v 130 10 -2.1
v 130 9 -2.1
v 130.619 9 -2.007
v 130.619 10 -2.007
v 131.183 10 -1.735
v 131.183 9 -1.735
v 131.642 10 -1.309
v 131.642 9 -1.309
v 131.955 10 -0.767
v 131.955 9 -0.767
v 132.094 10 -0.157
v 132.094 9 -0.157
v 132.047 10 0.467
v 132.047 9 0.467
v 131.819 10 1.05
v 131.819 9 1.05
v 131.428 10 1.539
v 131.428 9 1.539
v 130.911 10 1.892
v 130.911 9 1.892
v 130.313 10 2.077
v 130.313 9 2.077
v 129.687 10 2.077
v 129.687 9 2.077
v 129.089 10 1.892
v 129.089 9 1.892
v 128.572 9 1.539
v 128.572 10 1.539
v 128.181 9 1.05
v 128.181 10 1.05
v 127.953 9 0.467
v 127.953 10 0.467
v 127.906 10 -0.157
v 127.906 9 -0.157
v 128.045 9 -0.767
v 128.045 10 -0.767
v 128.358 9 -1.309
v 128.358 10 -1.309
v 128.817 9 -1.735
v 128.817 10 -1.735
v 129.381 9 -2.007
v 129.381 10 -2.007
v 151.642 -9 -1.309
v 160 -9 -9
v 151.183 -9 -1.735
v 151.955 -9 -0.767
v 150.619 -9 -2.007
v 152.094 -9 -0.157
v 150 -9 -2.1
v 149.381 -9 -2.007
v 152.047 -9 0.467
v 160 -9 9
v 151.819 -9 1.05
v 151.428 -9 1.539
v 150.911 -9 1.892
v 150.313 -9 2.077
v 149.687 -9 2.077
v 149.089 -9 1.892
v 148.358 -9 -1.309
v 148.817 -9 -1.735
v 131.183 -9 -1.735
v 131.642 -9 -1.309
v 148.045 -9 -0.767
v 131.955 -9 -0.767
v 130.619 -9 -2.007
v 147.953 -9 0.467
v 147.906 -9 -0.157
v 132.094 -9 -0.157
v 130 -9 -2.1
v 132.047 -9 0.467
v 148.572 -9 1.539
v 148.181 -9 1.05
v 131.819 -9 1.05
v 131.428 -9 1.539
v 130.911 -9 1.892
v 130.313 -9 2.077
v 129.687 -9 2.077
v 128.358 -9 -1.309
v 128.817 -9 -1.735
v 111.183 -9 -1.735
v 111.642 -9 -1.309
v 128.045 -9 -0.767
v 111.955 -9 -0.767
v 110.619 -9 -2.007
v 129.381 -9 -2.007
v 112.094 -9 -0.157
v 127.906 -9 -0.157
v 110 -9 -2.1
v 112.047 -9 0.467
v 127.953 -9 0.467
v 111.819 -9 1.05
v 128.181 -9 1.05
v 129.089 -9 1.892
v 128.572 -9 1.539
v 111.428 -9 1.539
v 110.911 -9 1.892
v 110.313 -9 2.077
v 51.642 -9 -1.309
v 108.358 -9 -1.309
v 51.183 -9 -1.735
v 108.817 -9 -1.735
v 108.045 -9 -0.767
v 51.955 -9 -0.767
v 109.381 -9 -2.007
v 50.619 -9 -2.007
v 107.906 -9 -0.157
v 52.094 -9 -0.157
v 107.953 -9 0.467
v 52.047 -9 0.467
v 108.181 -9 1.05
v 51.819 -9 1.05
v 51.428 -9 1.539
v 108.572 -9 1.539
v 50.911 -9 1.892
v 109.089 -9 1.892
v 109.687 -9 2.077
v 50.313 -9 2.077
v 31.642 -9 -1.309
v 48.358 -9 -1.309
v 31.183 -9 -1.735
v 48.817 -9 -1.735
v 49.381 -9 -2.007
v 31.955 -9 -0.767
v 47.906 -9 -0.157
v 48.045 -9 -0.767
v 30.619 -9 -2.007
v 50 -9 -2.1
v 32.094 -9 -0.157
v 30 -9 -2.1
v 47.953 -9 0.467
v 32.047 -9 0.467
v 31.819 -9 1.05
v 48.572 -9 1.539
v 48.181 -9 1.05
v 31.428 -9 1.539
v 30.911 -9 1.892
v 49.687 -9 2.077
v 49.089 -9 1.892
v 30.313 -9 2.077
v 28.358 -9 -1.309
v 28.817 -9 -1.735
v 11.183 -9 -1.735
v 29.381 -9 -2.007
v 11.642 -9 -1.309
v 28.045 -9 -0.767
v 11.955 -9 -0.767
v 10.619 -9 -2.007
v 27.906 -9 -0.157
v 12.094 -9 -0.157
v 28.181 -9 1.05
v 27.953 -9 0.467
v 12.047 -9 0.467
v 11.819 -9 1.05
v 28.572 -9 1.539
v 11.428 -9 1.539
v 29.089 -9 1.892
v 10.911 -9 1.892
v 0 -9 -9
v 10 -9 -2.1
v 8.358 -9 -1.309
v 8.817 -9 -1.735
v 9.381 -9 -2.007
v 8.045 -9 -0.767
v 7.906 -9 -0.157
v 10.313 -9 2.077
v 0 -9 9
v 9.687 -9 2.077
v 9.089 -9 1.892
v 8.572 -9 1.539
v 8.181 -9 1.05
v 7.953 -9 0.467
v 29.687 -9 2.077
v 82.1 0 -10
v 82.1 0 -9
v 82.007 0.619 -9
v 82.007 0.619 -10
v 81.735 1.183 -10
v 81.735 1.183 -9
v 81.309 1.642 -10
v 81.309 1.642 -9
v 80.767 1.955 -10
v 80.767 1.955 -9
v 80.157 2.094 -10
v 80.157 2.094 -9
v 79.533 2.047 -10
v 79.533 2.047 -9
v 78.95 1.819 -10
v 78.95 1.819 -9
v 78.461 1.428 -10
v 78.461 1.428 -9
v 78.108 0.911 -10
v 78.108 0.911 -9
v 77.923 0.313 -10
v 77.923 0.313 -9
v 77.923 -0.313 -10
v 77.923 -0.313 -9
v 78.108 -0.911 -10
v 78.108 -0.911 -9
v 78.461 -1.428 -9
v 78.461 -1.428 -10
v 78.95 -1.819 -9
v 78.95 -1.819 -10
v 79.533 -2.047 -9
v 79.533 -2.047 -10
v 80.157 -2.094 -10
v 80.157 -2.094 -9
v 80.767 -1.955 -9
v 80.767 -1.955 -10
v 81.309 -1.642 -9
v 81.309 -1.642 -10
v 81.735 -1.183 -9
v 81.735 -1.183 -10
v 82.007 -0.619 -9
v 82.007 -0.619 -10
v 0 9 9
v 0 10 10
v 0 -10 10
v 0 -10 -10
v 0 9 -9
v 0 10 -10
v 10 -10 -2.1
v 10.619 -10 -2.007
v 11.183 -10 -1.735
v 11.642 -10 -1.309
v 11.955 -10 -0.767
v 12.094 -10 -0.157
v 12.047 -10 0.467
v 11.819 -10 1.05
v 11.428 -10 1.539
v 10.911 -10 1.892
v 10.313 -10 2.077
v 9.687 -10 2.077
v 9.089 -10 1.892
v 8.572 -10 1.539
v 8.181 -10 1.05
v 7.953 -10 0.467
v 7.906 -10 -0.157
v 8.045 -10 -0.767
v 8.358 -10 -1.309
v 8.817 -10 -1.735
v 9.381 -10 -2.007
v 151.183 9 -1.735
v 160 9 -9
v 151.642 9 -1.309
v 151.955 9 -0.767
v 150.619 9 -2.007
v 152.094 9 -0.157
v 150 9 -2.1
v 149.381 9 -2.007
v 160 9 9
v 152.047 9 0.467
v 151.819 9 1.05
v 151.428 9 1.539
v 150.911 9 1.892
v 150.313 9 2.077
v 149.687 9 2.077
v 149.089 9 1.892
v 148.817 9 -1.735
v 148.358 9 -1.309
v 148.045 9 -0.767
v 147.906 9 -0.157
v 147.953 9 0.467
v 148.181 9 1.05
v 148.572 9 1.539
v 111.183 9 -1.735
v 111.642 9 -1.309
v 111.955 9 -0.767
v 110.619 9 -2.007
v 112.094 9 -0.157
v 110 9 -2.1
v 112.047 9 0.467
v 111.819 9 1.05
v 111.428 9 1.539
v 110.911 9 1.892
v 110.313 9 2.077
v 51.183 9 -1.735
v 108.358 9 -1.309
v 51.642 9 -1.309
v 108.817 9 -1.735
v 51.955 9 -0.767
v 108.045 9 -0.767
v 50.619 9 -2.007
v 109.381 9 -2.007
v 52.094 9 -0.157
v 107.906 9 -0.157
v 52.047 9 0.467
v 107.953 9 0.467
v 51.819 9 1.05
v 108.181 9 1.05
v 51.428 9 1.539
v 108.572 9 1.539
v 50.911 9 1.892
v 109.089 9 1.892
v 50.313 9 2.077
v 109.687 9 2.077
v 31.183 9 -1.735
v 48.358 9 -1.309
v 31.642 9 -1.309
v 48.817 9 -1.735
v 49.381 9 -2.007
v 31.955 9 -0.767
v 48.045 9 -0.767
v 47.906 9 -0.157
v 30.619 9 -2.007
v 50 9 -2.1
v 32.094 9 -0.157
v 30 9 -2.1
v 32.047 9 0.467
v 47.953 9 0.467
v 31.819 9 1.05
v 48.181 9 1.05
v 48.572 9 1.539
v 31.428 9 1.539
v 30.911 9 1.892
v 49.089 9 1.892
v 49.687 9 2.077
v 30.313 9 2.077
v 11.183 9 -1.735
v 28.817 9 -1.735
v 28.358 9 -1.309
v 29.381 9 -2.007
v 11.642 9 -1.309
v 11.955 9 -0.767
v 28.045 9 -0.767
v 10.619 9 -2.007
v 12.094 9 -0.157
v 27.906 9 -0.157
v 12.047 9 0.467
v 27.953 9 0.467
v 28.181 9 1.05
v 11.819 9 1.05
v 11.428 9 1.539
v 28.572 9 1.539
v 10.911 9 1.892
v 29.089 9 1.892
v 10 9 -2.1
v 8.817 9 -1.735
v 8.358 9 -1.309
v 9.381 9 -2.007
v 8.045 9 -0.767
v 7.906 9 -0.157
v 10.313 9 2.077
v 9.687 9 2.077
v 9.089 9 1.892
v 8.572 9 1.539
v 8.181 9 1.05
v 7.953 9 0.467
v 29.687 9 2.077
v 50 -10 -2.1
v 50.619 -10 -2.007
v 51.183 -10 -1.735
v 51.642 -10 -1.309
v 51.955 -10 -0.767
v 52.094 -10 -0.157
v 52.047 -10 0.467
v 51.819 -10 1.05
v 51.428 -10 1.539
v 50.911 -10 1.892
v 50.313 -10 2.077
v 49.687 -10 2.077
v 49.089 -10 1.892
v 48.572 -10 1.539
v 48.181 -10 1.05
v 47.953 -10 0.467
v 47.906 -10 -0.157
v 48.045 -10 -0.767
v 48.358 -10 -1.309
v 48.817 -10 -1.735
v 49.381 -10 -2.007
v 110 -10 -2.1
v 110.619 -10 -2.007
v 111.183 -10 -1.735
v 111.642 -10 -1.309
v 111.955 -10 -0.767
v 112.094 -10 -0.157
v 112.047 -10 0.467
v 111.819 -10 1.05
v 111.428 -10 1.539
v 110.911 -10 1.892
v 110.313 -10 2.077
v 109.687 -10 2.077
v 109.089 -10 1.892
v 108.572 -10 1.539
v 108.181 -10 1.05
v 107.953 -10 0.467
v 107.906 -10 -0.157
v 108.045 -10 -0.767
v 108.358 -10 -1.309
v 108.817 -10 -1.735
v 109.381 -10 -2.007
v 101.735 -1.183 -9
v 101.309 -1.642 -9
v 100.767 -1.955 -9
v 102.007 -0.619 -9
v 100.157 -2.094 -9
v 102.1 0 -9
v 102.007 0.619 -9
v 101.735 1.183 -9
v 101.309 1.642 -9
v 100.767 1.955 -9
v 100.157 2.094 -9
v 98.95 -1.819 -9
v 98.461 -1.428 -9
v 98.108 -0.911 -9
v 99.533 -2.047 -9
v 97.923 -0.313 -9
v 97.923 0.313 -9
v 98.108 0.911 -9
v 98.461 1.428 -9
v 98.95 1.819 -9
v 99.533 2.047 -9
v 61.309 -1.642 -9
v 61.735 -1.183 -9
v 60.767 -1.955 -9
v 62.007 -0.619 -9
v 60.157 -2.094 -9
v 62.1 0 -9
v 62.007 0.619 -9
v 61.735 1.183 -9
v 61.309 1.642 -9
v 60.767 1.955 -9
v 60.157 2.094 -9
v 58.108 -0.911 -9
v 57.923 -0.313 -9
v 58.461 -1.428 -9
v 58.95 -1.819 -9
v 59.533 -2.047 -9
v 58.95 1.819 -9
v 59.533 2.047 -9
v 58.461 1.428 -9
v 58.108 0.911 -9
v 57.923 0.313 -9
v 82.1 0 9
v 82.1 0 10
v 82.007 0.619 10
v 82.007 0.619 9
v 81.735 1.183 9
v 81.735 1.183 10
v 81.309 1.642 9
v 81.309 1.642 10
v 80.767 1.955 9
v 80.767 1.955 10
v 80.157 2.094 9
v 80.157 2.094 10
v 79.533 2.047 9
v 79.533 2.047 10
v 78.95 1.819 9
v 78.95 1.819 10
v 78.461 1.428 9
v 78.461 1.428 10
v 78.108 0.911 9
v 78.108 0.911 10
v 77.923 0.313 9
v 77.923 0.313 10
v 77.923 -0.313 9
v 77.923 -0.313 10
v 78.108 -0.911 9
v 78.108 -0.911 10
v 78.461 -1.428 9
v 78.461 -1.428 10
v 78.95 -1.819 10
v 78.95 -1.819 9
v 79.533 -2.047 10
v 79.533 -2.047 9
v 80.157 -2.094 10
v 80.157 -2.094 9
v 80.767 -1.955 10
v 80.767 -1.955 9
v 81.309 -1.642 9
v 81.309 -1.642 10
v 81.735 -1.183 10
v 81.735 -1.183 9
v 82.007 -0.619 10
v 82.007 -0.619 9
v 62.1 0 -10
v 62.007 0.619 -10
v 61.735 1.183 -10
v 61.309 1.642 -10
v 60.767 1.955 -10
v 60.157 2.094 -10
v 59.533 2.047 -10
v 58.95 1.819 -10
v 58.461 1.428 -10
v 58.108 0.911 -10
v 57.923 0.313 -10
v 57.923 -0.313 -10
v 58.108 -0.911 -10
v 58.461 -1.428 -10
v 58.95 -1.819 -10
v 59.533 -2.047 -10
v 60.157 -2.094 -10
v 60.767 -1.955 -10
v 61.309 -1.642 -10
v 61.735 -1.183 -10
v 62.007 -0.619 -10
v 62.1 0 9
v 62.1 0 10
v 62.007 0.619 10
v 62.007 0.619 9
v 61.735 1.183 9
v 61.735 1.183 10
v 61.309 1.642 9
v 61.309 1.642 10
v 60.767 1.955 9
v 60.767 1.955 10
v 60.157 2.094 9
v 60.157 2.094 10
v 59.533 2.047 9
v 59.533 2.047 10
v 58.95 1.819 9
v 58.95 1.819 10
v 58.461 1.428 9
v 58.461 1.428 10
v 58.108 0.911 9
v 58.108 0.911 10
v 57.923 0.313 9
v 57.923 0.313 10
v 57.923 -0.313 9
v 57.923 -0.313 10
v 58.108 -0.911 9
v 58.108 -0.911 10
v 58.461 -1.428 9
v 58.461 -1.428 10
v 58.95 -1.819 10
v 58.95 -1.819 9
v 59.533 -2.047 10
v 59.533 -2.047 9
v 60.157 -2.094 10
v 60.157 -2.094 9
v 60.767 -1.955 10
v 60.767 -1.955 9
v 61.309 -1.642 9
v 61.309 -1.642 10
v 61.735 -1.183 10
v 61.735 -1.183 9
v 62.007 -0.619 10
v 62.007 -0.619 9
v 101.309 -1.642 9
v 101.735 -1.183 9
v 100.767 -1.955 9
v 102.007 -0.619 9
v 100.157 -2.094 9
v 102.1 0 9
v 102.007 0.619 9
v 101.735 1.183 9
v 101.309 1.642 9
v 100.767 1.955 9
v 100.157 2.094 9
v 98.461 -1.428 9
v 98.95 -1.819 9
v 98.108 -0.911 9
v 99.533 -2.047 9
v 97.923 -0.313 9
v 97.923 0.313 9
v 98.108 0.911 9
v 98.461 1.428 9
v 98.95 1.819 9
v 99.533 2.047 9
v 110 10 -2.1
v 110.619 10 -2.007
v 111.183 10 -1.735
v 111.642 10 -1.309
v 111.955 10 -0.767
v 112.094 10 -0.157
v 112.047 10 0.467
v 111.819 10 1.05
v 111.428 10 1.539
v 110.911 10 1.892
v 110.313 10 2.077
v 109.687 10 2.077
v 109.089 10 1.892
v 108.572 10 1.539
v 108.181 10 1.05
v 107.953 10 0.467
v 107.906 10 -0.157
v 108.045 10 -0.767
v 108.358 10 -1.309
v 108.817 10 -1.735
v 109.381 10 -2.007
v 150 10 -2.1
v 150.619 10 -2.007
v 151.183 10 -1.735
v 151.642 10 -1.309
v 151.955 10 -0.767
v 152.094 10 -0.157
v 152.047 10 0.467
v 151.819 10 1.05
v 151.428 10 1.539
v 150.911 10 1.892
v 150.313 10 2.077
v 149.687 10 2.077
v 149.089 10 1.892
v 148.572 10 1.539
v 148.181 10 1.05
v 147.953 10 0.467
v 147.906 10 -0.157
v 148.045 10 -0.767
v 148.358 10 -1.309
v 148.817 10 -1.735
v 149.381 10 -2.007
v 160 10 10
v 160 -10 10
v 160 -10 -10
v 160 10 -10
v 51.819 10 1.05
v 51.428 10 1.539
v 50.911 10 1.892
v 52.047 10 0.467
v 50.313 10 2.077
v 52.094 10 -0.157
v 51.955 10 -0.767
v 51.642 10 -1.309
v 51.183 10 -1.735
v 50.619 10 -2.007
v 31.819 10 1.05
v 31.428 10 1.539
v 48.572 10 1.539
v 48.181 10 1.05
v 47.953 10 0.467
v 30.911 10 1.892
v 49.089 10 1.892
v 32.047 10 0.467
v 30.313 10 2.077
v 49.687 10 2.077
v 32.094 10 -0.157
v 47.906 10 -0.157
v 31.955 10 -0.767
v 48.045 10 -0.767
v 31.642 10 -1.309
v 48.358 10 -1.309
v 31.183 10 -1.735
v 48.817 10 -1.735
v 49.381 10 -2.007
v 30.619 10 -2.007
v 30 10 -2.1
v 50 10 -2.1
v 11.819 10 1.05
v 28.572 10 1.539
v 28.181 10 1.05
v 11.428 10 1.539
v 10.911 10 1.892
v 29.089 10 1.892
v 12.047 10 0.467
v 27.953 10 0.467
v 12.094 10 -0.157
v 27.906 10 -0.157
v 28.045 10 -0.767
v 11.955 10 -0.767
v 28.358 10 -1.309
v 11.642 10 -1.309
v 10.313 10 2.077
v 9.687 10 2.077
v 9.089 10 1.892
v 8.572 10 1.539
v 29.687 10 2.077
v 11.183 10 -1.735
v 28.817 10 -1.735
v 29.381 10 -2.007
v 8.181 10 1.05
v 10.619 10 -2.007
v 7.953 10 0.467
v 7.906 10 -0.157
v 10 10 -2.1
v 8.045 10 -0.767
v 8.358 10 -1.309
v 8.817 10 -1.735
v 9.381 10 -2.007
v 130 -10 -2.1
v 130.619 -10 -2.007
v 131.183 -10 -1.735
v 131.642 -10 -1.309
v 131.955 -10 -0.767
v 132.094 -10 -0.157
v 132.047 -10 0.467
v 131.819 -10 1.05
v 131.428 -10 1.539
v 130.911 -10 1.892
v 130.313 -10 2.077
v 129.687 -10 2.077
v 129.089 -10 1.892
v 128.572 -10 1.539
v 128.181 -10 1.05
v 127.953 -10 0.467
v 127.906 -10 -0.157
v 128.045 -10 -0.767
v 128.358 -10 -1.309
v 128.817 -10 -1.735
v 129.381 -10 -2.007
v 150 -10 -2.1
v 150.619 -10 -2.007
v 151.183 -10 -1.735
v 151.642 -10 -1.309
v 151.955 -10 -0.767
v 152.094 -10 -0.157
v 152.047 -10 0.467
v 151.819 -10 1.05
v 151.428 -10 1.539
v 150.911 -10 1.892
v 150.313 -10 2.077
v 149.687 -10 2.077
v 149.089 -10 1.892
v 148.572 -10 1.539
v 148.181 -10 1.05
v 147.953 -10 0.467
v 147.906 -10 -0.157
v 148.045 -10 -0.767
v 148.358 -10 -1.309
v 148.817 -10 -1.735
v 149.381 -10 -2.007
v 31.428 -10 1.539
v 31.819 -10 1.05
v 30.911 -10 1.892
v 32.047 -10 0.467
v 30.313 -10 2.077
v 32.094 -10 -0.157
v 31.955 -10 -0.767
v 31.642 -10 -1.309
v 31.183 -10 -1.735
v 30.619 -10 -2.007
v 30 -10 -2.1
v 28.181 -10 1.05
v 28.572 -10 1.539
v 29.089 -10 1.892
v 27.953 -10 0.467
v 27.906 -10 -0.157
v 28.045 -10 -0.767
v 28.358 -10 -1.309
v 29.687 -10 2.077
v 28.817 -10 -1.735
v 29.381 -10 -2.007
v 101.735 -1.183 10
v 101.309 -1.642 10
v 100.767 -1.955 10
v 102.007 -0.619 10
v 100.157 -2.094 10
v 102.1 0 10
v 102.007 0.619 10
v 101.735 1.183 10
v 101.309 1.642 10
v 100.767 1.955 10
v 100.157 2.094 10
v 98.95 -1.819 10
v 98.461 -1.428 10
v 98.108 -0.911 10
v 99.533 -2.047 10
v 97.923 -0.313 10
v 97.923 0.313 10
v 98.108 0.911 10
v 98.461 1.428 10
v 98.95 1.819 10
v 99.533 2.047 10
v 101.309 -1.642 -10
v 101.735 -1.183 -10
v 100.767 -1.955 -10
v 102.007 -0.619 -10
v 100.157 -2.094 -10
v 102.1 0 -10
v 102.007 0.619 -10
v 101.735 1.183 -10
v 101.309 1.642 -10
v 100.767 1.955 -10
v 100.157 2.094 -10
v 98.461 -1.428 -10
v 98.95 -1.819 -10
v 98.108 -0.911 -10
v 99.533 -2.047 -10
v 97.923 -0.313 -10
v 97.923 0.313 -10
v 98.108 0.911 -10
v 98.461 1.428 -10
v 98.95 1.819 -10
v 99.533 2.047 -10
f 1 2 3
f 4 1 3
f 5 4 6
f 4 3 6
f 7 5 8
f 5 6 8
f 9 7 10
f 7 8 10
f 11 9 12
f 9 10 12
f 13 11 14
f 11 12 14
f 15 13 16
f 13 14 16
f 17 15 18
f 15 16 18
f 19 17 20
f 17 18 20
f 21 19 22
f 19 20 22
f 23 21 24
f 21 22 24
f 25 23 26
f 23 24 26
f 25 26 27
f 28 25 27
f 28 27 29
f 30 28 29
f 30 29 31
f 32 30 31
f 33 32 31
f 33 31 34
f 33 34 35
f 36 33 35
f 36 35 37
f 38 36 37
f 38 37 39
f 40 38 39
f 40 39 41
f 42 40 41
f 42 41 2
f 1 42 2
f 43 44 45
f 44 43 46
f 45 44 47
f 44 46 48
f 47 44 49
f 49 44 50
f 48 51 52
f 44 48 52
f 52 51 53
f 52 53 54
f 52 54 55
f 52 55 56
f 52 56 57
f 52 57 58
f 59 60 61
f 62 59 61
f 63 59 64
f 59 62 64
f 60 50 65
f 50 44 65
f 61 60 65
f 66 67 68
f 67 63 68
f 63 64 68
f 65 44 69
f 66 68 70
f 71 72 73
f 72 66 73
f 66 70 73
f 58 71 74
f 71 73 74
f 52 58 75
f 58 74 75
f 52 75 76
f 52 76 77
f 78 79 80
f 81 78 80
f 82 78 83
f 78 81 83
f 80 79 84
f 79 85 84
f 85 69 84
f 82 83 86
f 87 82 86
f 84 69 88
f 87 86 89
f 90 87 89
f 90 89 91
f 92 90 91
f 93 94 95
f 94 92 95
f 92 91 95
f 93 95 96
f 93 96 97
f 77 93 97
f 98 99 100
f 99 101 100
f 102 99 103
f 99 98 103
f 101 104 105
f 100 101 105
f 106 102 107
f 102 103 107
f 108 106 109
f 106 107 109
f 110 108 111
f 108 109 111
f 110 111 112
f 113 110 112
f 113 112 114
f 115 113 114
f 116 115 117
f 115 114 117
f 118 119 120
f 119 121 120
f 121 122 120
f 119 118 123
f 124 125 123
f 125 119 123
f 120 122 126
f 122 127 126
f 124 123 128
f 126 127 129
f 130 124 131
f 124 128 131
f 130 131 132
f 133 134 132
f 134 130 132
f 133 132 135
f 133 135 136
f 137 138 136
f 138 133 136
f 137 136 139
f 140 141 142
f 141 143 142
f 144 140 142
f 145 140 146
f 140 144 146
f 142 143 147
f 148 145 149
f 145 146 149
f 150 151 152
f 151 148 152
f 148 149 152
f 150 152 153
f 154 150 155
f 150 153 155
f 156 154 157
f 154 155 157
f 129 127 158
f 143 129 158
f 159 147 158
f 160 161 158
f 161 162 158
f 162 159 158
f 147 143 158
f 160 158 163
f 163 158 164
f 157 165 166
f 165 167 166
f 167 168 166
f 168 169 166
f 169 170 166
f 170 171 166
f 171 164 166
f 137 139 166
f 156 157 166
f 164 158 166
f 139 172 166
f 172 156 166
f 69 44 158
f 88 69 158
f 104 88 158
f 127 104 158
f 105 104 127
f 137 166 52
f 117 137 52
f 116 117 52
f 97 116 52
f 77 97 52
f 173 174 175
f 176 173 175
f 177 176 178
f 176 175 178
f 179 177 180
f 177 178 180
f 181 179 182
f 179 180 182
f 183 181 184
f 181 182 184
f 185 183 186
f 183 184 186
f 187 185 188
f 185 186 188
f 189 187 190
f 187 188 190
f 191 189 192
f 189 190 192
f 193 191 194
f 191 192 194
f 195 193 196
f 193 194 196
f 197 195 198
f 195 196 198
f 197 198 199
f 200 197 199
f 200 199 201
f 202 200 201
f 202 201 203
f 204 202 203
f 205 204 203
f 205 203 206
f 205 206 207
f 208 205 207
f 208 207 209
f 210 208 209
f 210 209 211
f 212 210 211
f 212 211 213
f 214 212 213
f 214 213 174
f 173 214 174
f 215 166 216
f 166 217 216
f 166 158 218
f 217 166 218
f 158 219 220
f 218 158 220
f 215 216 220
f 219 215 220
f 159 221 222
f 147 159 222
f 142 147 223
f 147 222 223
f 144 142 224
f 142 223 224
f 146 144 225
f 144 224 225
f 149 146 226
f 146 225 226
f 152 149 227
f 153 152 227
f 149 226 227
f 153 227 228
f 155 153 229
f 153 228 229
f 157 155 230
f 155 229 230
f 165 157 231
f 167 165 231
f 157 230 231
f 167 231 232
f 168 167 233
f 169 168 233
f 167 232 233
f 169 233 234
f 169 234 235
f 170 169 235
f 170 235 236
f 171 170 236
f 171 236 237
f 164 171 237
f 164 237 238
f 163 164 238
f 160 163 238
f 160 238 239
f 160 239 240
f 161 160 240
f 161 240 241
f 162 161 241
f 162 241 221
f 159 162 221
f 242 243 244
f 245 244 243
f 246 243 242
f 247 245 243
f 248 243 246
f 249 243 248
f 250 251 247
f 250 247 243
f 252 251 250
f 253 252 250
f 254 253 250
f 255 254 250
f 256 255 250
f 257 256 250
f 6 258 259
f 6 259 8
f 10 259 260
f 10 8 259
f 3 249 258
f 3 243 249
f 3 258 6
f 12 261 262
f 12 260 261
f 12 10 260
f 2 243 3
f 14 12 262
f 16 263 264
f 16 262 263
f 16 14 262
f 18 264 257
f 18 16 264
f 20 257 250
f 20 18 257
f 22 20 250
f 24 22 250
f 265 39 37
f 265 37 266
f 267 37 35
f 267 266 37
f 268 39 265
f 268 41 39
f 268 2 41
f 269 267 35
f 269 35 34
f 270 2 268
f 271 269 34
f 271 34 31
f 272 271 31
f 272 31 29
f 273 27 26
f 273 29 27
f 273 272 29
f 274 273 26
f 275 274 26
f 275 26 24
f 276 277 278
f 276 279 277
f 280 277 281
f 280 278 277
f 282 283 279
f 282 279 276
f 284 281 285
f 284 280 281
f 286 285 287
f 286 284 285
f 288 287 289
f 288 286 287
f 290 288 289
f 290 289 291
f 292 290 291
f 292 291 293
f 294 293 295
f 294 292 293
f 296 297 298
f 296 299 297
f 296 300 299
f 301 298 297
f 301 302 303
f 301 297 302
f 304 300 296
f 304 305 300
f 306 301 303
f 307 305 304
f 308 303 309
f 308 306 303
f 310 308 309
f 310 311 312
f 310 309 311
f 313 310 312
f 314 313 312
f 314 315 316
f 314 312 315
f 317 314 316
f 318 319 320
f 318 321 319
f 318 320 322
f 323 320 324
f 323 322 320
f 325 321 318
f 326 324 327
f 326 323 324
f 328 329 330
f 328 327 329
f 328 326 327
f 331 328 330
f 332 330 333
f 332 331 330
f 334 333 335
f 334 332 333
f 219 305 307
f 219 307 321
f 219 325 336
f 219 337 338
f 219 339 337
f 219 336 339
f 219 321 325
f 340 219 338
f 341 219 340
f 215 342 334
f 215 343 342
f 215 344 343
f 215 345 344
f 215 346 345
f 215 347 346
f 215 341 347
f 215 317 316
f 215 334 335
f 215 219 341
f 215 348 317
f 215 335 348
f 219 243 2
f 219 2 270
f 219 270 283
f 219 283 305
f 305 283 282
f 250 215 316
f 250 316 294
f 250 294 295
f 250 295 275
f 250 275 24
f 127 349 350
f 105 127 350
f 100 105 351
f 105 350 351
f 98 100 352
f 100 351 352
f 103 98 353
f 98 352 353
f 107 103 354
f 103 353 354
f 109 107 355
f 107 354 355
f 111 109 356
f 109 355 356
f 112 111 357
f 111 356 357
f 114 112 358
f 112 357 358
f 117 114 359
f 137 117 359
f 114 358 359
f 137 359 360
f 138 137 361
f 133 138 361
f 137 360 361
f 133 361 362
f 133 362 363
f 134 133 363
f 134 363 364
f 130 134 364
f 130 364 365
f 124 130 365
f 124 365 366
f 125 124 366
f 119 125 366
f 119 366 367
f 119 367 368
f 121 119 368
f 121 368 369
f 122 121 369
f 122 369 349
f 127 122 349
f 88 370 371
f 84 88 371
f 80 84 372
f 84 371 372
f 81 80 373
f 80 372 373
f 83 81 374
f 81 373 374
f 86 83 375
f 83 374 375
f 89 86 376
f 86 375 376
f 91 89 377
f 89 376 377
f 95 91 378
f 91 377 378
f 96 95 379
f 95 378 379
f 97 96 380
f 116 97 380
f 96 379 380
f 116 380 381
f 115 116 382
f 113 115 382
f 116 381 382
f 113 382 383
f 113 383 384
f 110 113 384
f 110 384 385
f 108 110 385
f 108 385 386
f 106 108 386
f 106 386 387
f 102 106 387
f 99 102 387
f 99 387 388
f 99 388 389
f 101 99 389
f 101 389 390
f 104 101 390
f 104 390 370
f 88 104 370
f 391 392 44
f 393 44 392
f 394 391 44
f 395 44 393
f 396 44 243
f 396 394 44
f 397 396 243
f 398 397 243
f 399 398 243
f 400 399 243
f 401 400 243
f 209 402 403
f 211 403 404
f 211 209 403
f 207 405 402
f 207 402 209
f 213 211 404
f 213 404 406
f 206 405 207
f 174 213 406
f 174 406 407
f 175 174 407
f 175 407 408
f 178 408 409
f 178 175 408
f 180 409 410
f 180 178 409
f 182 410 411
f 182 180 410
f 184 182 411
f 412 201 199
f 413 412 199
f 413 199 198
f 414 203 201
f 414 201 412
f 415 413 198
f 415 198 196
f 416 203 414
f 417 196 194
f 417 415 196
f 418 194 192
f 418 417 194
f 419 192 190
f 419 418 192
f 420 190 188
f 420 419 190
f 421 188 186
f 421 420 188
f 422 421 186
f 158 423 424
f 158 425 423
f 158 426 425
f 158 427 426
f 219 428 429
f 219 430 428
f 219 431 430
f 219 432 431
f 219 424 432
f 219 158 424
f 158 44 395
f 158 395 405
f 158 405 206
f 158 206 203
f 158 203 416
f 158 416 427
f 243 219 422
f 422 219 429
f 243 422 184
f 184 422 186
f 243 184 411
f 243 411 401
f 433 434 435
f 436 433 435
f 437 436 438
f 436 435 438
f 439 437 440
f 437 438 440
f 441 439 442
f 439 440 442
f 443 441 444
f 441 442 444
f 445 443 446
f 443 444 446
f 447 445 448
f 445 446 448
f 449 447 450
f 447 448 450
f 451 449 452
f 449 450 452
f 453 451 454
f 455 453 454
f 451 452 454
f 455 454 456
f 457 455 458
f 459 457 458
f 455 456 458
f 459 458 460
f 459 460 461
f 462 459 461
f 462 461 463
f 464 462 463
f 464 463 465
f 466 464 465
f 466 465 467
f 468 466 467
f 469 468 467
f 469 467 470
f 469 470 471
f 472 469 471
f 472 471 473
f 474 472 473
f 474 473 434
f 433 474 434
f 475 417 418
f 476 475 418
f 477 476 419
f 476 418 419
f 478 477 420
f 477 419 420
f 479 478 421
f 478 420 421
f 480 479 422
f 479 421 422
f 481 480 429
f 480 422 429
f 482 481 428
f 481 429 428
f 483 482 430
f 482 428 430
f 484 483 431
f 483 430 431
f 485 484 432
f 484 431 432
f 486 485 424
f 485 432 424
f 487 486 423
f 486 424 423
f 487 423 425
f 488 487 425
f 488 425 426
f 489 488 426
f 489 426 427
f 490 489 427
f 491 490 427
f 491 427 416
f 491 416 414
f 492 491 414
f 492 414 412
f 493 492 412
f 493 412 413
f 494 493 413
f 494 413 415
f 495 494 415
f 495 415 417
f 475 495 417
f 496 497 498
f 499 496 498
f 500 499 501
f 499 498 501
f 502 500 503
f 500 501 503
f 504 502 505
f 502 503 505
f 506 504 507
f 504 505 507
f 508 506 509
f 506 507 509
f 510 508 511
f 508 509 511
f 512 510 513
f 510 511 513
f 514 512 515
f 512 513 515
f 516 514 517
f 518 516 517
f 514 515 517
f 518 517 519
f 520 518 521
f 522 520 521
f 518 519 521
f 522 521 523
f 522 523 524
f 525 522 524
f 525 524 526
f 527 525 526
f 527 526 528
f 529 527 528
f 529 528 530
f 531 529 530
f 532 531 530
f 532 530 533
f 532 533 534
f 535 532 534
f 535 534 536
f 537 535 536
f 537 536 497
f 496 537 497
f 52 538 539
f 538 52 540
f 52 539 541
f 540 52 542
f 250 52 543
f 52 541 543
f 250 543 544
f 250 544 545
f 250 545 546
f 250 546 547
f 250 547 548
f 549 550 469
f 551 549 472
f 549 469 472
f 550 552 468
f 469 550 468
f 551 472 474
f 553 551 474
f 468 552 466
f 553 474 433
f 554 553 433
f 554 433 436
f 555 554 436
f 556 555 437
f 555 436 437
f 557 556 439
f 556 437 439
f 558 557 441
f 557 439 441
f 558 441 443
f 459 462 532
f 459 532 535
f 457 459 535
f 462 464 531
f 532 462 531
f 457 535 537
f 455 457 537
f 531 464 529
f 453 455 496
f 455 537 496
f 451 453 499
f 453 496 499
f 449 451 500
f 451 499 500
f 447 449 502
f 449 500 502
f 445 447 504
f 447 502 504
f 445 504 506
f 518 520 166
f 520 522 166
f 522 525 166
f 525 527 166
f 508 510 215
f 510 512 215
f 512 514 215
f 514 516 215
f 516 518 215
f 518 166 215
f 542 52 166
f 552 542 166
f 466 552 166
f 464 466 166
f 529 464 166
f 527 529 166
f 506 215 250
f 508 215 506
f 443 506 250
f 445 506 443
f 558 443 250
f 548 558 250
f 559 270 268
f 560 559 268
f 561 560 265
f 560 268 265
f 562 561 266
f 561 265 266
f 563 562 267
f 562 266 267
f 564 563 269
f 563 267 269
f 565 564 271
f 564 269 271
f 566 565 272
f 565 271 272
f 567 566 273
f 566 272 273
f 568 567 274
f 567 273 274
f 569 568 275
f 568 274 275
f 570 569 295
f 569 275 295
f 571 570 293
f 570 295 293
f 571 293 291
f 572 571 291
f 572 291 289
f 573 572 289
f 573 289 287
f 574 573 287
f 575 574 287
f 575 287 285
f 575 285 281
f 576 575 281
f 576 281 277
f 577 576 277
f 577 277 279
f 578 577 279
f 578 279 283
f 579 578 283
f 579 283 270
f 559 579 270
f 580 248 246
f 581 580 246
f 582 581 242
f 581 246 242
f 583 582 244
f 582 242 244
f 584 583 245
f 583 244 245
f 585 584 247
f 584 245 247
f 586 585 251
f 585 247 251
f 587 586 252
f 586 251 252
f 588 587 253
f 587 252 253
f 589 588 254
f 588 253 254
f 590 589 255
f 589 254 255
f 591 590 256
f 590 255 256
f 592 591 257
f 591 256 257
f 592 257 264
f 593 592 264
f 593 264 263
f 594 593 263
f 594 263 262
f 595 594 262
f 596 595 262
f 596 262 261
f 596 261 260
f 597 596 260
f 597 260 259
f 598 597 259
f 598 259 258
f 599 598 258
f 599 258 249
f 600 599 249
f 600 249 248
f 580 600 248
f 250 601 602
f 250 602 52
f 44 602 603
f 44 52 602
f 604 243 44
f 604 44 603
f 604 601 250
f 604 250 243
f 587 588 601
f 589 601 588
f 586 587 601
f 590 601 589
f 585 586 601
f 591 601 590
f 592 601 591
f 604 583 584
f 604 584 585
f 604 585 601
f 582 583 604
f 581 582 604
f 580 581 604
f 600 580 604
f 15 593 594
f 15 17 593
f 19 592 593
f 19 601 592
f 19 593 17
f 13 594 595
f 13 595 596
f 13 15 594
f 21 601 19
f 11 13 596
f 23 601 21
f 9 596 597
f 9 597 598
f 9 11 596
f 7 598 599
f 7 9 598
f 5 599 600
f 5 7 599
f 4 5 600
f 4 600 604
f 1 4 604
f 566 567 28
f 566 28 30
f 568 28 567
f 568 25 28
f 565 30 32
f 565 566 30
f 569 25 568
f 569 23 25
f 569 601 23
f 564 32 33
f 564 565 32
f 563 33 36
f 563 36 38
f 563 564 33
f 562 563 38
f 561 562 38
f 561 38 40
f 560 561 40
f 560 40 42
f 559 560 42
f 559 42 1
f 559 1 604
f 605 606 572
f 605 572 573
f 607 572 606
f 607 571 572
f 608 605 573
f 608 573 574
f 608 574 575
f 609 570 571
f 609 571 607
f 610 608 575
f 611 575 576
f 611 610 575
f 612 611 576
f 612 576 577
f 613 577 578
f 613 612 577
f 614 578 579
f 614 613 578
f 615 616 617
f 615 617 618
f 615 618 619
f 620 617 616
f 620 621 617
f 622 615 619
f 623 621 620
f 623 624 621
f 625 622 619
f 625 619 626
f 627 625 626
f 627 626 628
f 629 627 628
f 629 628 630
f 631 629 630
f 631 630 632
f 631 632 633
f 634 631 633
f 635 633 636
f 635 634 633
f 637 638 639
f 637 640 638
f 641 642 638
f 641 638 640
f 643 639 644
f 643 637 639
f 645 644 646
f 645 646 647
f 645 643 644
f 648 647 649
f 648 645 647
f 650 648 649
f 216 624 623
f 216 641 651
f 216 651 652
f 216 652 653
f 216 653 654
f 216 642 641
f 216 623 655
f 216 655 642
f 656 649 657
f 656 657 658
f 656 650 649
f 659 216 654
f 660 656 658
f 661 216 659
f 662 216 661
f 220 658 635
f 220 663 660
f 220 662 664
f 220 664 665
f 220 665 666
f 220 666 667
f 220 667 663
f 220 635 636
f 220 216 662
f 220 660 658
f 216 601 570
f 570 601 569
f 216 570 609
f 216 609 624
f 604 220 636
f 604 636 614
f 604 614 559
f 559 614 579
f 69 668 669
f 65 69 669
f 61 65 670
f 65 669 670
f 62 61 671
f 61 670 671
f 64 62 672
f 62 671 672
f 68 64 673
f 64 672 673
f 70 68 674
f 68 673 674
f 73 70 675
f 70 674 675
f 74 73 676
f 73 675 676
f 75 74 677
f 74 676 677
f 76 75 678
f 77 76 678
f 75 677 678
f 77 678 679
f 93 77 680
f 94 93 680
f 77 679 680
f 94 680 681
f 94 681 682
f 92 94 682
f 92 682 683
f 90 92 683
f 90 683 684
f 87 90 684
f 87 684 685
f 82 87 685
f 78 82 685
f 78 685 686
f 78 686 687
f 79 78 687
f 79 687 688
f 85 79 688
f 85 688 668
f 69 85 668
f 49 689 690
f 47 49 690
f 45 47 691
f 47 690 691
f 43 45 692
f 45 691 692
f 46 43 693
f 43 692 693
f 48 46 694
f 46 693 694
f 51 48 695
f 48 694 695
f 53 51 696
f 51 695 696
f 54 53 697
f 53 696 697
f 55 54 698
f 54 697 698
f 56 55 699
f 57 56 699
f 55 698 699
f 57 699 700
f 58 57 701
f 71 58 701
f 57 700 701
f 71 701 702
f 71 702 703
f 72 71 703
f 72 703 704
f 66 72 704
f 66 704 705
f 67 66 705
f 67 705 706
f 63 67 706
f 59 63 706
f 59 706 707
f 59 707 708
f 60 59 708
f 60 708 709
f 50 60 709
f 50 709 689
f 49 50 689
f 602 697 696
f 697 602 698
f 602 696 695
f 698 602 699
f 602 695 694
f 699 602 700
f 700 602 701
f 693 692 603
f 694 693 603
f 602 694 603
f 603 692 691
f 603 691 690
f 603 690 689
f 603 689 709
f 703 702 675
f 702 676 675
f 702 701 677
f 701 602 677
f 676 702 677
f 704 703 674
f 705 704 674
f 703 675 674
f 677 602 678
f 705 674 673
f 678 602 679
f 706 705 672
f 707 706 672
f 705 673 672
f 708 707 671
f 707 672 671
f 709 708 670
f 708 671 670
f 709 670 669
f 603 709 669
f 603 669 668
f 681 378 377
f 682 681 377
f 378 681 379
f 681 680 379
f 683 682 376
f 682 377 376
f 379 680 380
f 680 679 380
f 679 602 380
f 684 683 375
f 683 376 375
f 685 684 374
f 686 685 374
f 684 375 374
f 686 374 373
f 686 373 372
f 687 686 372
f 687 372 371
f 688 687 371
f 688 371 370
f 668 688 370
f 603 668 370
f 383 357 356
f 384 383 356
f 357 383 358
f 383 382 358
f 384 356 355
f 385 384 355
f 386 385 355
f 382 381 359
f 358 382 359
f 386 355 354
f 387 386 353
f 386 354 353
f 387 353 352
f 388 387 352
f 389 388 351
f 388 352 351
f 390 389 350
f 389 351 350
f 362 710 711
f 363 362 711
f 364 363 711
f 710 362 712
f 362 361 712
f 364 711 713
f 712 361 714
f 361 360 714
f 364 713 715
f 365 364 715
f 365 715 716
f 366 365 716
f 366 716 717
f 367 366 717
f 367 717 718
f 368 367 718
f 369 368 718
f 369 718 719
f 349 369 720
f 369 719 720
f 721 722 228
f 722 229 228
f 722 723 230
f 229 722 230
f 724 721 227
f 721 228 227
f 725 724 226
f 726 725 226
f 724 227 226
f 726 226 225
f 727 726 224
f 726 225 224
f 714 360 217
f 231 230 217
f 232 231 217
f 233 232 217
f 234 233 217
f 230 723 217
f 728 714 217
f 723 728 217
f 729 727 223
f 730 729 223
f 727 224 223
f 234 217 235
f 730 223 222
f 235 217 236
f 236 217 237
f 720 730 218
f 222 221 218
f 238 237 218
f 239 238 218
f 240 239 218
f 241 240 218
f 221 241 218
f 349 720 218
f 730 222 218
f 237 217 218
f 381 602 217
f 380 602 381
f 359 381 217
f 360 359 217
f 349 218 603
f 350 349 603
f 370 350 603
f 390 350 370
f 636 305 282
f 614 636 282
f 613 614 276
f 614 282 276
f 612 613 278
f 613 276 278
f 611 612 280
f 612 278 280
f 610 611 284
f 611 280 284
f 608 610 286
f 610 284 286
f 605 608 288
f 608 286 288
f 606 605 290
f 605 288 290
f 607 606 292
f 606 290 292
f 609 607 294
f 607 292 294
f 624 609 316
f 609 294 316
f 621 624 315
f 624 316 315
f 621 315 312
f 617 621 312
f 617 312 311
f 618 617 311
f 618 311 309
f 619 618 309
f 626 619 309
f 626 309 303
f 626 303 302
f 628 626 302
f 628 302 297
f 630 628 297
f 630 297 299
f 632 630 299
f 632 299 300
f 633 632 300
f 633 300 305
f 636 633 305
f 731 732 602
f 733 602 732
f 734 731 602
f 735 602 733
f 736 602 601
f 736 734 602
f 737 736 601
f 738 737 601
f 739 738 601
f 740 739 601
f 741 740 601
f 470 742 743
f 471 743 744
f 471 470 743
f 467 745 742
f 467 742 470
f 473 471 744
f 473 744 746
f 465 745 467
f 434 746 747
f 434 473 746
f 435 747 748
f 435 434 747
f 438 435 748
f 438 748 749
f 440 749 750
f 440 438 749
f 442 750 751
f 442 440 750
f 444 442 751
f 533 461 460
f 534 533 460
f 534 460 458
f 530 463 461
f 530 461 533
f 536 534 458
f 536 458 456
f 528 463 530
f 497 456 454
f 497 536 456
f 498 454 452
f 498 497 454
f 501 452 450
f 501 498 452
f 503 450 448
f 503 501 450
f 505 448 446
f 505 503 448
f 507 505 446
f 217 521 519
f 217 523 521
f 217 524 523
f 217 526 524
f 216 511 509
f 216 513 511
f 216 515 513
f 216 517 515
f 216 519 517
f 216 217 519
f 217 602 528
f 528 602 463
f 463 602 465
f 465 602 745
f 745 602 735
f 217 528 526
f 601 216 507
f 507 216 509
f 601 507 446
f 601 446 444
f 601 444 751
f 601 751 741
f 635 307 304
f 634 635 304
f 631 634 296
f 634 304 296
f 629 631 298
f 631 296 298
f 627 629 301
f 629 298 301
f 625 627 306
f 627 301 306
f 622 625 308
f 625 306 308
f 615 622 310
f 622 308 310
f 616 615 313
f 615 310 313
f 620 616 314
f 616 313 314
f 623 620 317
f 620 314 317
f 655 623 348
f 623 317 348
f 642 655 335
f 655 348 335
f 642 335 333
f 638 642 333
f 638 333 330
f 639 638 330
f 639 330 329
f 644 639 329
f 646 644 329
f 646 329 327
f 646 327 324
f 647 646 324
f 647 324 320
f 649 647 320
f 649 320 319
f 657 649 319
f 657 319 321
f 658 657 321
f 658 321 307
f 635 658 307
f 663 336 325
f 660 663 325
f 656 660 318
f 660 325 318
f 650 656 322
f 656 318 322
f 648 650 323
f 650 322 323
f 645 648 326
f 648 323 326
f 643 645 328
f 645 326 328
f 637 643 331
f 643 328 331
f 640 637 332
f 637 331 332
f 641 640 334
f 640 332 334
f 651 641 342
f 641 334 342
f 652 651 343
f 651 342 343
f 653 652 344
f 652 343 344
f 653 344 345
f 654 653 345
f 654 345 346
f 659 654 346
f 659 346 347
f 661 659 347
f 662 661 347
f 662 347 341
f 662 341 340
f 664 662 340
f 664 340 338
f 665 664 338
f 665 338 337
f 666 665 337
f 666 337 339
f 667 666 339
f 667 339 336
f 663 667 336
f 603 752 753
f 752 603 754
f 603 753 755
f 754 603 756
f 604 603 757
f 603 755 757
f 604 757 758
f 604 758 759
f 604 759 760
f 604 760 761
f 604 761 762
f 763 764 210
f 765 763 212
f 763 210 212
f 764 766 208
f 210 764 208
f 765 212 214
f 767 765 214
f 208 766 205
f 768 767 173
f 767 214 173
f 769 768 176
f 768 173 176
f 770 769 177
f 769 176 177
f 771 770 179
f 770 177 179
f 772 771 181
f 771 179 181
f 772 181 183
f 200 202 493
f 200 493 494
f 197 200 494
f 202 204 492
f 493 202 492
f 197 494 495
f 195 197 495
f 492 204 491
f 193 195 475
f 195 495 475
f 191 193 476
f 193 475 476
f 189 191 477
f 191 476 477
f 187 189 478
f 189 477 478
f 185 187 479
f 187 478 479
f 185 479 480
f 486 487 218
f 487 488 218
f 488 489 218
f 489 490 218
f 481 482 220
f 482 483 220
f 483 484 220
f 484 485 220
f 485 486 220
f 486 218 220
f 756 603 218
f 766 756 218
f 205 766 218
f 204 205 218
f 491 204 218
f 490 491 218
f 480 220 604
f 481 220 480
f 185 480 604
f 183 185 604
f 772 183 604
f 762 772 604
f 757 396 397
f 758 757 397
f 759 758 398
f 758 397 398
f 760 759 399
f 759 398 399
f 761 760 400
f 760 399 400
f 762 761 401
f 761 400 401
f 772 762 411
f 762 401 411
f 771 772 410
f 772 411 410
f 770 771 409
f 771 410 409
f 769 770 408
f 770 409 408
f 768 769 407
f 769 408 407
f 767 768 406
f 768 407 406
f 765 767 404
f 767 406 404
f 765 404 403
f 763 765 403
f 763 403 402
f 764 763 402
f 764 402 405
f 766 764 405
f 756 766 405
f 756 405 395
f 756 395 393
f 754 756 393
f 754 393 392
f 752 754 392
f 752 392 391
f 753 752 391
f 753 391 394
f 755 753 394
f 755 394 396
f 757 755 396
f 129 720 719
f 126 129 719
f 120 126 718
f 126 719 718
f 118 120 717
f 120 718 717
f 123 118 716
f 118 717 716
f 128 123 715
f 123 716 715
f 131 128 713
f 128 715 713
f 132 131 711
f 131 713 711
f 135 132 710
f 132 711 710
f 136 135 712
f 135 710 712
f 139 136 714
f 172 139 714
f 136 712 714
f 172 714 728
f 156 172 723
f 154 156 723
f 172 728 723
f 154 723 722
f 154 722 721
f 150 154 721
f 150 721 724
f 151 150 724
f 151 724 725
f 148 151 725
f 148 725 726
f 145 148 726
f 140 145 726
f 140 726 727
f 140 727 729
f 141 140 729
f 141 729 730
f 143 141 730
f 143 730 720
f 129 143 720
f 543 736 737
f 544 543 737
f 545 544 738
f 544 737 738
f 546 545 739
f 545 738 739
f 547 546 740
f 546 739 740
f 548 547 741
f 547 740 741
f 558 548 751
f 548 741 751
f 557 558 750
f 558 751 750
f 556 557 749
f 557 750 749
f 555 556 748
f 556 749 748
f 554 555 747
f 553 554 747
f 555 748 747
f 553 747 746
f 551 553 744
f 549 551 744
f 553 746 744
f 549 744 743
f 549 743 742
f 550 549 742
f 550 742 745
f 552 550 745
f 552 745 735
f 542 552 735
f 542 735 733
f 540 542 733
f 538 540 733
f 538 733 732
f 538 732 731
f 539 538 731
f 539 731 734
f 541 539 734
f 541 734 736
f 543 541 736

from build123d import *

# Parameters (mm, degrees)
SKETCH_1_W          = 20
SKETCH_1_H          = 20
EXTRUDE_1_DEPTH     = 160
SKETCH_2_R          = 2.1
CUT_EXTRUDE_1_DEPTH = 160
SKETCH_3_R          = 2.1
CUT_EXTRUDE_2_DEPTH = 162.554944214
SKETCH_4_W          = 18
SKETCH_4_H          = 18
CUT_EXTRUDE_3_DEPTH = 161.623784042


with BuildPart() as part:
    # 草图1 → 凸台-拉伸1 (new body)
    with BuildSketch(Plane(origin=(0, 0, 0), x_dir=(0, 0, -1), z_dir=(1, 0, 0))):
        Rectangle(SKETCH_1_W, SKETCH_1_H)
    extrude(amount=EXTRUDE_1_DEPTH)

    # 草图2 → 切除-拉伸1 (cut)
    with BuildSketch(Plane.XZ.offset(10)):
        with Locations(Location((10, 0, 0), (0, 0, 270))):
            Circle(SKETCH_2_R)
        with Locations(Location((30, 0, 0), (0, 0, 270))):
            Circle(SKETCH_2_R)
        with Locations(Location((50, 0, 0), (0, 0, 270))):
            Circle(SKETCH_2_R)
        with Locations(Location((110, 0, 0), (0, 0, 270))):
            Circle(SKETCH_2_R)
        with Locations(Location((130, 0, 0), (0, 0, 270))):
            Circle(SKETCH_2_R)
        with Locations(Location((150, 0, 0), (0, 0, 270))):
            Circle(SKETCH_2_R)
    extrude(amount=-CUT_EXTRUDE_1_DEPTH, mode=Mode.SUBTRACT)

    # 草图3 → 切除-拉伸2 (cut, through all)
    with BuildSketch(Plane.XY.offset(10)):
        with Locations((60, 0)):
            Circle(SKETCH_3_R)
        with Locations((80, 0)):
            Circle(SKETCH_3_R)
        with Locations((100, 0)):
            Circle(SKETCH_3_R)
    extrude(amount=-CUT_EXTRUDE_2_DEPTH, mode=Mode.SUBTRACT)

    # 草图4 → 切除-拉伸3 (cut, through all)
    with BuildSketch(Plane.ZY):
        Rectangle(SKETCH_4_W, SKETCH_4_H)
    extrude(amount=-CUT_EXTRUDE_3_DEPTH, mode=Mode.SUBTRACT)


solid = part.part
